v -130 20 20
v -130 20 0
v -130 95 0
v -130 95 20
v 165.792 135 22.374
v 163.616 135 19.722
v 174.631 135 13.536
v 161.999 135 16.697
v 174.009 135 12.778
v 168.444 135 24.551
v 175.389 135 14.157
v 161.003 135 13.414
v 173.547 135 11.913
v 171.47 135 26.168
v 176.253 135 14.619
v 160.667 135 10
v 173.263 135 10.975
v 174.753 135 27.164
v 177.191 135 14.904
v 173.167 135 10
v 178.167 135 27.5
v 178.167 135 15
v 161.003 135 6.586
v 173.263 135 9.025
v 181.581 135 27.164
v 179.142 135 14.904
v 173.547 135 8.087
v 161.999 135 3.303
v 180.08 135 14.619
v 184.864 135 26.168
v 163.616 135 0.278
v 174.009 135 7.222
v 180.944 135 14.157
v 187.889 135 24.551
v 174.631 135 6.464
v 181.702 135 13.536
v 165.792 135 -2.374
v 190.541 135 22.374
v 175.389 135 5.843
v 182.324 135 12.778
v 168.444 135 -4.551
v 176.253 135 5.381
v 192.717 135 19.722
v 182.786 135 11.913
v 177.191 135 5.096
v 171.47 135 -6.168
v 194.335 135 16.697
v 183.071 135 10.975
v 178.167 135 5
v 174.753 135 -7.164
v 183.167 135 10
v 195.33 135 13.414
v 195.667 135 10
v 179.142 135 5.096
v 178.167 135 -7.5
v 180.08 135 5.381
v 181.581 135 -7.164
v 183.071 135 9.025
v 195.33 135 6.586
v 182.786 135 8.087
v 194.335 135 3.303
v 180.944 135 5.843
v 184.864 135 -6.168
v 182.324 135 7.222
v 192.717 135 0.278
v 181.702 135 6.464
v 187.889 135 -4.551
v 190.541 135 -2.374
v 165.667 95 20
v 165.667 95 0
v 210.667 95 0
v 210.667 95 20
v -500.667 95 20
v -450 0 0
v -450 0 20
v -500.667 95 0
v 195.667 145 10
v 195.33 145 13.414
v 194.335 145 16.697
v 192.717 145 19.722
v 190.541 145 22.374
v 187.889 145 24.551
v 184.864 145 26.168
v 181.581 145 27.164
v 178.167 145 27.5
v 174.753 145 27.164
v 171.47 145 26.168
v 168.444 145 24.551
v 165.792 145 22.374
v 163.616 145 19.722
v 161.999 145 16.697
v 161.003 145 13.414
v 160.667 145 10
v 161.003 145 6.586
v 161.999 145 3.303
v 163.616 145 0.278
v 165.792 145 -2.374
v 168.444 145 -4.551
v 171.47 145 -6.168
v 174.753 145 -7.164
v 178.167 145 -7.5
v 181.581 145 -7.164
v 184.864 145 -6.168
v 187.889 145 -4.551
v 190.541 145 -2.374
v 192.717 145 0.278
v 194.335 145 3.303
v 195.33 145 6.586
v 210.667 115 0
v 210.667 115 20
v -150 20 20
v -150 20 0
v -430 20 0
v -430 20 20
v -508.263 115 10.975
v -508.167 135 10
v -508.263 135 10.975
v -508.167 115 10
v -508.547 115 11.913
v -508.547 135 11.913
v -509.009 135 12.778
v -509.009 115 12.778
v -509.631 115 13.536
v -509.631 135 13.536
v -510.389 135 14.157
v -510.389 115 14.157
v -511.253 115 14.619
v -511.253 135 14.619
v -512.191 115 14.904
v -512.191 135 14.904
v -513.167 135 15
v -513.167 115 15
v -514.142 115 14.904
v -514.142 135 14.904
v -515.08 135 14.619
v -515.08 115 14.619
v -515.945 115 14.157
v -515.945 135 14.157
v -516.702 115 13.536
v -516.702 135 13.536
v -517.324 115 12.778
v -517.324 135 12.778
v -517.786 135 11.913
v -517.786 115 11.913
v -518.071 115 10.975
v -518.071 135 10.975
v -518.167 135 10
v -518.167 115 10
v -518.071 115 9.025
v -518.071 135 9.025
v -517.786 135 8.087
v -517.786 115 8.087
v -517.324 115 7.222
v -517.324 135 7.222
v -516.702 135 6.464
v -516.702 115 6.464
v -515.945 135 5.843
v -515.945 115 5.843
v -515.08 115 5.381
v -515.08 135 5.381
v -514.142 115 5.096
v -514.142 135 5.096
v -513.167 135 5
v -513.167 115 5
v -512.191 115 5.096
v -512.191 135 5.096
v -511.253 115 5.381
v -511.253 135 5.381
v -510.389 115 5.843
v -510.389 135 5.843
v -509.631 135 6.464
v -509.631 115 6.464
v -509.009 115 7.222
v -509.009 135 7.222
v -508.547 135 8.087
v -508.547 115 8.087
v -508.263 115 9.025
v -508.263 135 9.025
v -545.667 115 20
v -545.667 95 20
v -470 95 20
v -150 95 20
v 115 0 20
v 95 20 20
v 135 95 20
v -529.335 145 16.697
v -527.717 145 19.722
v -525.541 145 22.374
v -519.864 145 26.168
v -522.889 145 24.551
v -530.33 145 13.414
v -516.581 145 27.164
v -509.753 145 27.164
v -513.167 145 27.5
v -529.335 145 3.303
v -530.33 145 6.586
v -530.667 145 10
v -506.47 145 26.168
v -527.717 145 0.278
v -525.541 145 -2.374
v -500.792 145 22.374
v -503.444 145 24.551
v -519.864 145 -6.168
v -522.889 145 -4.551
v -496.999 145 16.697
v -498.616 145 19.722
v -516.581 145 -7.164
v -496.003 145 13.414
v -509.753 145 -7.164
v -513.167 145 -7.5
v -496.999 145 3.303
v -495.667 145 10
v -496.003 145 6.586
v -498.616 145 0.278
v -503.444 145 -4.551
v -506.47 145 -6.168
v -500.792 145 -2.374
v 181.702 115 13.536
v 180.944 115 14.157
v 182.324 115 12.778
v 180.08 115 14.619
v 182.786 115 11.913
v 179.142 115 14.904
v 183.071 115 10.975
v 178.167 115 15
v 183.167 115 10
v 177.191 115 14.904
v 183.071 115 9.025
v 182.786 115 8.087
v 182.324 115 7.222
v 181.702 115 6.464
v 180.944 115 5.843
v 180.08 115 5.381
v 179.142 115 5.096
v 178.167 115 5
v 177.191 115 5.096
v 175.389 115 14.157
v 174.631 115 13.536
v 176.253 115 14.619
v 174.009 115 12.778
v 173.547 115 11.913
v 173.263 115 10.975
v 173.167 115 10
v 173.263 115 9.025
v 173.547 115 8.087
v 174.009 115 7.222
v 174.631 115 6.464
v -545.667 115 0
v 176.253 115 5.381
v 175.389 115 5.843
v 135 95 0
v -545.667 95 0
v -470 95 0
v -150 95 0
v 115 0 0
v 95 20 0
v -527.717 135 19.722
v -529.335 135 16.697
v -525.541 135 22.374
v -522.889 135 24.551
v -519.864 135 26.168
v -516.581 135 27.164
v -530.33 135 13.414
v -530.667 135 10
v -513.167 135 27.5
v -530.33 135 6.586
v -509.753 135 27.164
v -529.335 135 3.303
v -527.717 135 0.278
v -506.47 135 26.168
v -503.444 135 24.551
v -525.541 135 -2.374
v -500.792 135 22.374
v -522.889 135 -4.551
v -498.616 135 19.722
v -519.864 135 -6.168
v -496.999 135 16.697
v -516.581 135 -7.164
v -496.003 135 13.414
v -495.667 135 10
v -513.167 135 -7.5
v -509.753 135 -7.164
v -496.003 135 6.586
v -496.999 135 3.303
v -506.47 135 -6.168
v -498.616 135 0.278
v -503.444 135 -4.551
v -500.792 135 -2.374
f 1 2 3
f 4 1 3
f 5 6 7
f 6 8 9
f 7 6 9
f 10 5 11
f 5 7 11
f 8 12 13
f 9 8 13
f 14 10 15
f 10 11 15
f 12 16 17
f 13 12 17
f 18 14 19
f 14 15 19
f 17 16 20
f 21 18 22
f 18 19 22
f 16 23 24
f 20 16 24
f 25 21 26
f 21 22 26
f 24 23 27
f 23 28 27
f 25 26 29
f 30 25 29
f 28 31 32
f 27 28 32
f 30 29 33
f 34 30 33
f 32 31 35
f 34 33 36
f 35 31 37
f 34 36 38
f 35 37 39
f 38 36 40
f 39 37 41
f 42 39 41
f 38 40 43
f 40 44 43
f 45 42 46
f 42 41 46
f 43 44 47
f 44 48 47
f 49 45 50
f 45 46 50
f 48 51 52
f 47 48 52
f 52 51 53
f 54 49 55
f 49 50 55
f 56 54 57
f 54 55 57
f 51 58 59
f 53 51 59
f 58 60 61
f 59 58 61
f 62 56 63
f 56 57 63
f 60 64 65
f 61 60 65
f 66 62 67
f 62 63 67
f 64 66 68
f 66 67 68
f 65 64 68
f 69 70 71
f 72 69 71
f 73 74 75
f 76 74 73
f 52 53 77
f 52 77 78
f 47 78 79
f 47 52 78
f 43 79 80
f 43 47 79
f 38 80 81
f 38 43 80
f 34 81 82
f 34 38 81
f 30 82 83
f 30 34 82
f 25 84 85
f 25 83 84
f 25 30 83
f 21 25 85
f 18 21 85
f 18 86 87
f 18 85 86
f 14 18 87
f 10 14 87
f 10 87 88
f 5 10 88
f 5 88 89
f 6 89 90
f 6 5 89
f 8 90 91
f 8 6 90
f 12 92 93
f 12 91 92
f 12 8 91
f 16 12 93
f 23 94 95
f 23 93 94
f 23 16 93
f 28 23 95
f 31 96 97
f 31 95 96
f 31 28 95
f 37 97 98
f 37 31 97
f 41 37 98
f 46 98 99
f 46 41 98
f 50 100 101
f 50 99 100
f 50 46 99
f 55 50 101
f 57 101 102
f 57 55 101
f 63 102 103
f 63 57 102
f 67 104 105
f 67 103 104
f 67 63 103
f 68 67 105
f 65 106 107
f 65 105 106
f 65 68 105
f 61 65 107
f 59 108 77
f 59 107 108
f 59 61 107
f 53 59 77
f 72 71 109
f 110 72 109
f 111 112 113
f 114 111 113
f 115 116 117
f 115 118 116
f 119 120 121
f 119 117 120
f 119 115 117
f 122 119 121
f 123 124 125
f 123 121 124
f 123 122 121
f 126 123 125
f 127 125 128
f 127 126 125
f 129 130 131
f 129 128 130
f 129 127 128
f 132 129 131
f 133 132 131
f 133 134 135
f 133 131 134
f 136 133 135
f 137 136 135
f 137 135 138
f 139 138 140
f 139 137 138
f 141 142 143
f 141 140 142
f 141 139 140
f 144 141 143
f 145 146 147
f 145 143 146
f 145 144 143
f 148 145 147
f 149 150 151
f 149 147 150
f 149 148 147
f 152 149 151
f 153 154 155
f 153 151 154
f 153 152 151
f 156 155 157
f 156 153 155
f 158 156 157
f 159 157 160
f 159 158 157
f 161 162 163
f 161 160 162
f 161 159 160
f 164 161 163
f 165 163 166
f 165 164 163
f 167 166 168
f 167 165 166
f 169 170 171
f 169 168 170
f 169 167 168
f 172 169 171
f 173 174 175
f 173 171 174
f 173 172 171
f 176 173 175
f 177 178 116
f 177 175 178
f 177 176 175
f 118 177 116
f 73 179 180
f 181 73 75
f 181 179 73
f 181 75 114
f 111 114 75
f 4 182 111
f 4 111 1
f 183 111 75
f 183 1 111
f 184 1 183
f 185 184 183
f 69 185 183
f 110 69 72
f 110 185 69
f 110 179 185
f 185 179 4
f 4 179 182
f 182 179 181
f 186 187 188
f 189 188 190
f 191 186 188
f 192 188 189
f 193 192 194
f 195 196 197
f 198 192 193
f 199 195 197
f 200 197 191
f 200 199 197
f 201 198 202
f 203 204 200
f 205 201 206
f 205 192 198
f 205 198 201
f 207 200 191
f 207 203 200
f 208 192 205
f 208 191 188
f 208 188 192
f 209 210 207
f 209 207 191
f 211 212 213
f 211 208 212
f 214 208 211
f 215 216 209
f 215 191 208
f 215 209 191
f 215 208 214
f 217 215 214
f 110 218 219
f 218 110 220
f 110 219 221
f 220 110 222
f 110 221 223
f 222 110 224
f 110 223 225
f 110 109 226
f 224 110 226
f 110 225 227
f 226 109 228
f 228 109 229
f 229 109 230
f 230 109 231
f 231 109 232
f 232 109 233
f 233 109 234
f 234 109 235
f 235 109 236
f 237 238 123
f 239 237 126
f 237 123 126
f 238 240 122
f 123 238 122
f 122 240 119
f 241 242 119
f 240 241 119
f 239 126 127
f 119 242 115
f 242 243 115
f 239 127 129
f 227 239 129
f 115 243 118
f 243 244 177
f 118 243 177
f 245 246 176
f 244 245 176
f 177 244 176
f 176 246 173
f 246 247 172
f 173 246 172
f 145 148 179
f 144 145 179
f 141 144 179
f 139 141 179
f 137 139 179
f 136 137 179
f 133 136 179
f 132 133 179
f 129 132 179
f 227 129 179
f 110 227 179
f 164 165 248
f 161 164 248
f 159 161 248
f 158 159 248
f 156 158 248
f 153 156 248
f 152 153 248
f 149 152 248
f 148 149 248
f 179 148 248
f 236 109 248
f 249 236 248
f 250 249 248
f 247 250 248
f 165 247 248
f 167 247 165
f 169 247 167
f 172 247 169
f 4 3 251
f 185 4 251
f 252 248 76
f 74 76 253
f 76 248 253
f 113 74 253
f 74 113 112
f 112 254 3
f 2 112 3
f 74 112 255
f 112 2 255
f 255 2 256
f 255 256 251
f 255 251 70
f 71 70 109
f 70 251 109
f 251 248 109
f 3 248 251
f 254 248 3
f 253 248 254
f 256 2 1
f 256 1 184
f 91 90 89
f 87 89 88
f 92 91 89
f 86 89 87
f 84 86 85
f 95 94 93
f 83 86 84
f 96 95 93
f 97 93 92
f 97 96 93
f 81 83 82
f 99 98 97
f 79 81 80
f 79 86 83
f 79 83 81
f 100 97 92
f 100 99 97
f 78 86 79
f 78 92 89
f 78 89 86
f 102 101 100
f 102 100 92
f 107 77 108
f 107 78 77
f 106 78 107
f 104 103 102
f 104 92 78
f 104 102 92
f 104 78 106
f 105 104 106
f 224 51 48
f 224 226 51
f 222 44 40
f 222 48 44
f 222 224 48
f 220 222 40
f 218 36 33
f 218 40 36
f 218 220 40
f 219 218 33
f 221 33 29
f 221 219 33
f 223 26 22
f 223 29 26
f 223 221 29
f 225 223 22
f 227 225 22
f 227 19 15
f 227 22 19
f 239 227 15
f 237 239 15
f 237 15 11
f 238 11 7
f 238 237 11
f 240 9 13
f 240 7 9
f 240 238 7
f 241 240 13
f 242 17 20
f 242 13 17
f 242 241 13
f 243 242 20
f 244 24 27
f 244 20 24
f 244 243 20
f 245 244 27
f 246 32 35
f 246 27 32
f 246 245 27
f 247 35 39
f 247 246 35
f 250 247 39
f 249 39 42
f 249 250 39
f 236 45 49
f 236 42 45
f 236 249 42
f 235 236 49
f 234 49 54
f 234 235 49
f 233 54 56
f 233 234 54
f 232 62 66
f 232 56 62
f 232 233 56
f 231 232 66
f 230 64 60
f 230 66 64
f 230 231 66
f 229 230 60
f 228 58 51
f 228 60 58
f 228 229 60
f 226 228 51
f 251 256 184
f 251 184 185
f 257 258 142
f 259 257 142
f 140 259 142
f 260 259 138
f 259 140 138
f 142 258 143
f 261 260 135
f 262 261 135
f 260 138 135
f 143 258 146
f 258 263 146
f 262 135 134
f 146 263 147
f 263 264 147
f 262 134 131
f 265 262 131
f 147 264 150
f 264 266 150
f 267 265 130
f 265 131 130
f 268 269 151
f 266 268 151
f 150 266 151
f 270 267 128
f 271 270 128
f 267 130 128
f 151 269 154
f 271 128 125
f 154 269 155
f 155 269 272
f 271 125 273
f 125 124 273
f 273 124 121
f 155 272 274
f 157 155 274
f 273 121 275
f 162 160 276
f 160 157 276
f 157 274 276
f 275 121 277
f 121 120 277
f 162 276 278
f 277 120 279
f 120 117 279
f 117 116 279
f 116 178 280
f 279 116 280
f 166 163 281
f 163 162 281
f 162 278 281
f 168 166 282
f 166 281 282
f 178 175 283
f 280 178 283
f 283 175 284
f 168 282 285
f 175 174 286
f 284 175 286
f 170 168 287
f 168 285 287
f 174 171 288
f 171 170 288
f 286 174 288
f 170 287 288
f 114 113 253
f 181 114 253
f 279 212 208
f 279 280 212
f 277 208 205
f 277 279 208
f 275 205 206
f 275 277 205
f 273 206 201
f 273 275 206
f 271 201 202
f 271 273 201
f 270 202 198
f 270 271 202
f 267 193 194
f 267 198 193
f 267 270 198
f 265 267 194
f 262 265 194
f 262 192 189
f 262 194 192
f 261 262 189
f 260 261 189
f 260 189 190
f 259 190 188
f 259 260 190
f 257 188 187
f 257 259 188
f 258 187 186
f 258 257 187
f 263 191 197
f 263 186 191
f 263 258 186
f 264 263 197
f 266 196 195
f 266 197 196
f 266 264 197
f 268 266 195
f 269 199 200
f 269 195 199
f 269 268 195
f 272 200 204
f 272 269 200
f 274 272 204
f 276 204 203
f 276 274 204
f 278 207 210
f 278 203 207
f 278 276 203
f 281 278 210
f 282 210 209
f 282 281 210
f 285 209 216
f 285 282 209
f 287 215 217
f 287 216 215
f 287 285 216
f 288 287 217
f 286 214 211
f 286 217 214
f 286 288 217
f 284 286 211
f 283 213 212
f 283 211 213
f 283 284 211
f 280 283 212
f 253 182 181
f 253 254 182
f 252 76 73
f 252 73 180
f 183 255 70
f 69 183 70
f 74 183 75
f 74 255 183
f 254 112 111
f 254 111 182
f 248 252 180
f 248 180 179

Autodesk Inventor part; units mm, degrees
ref_plane "YZ Plane" through (0, 0, 0) normal (1, 0, 0) x (0, 1, 0)
ref_plane "XZ Plane" through (0, 0, 0) normal (0, 1, 0) x (-1, 0, 0)
ref_plane "XY Plane" through (0, 0, 0) normal (0, 0, 1) x (1, 0, 0)
sketch "草圖1" plane through (0, 0, 0) normal (0, 0, 1) x (1, 0, 0)
  line L0 (0, 0) -> (115, 0)
  line L1 (0, 0) -> (-450, 0)
  line L2 (-167.5, 95) -> (135, 95)
  line L3 (-167.5, 95) -> (-470, 95)
  line L4 (-167.5, 20) -> (95, 20)
  line L5 (-167.5, 20) -> (-430, 20)
  line L6 (-430, 20) -> (-470, 95)
  line L7 (95, 20) -> (135, 95)
  line L8 (115, 0) -> (165.6667, 95)
  line L9 (165.6667, 95) -> (210.6667, 95)
  line L10 (210.6667, 95) -> (210.6667, 115)
  line L11 (210.6667, 115) -> (-559.3333, 115)
  line L12 (-450, 0) -> (-500.6667, 95)
  line L13 (-500.6667, 95) -> (-545.6667, 95)
  line L14 (-545.6667, 95) -> (-545.6667, 115)
  line L15 (-130, 20) -> (-130, 95)
  line L16 (-130, 20) -> (-150, 20)
  line L17 (-150, 20) -> (-150, 95)
  dimension "d0" = 115
  dimension "d2" = 450
  dimension "d5" = 302.5
  dimension "d6" = 302.5
  dimension "d8" = 262.5
  dimension "d9" = 262.5
  dimension "d10" = 45
  dimension "d11" = 20
  dimension "d13" = 770
  dimension "d14" = 45
  dimension "d16" = 20
extrude "擠出1" add sketch "草圖1" along normal blind 20 contours L1 L12 L13 L14 L11 L10 L9 L8 L0 | L2 L15 L4 L17
sketch "草圖2" plane through (-545.6667, 115, 0) normal (0, 1, 0) x (1, 0, 0)
  line L0 (756.3333, 0) -> (756.3333, -20) projected
  circle A0 centre (723.8333, -10) radius 5
  line L1 (0, 0) -> (0, -20) projected
  circle A1 centre (32.5, -10) radius 5
  point P0 (545.6667, 0)
  dimension "d21" = 10
  dimension "d23" = 10
extrude "擠出2" add sketch "草圖2" along normal blind 20
sketch "草圖3" plane through (-513.1667, 135, 10) normal (0, 1, 0) x (1, 0, 0)
  circle A0 centre (0, 0) radius 5 projected
  circle A1 centre (0, 0) radius 17.5
  point P0 (513.1667, 10)
  dimension "d26" = 35
extrude "擠出3" add sketch "草圖3" along normal blind 10 contours A0 | A1
sketch "草圖4" plane through (178.1667, 135, 10) normal (0, 1, 0) x (1, 0, 0)
  circle A0 centre (0, 0) radius 17.5
  point P0 (-178.1667, 10)
  dimension "d29" = 35
extrude "擠出4" add sketch "草圖4" along normal blind 10
properties part number "DOF7"
